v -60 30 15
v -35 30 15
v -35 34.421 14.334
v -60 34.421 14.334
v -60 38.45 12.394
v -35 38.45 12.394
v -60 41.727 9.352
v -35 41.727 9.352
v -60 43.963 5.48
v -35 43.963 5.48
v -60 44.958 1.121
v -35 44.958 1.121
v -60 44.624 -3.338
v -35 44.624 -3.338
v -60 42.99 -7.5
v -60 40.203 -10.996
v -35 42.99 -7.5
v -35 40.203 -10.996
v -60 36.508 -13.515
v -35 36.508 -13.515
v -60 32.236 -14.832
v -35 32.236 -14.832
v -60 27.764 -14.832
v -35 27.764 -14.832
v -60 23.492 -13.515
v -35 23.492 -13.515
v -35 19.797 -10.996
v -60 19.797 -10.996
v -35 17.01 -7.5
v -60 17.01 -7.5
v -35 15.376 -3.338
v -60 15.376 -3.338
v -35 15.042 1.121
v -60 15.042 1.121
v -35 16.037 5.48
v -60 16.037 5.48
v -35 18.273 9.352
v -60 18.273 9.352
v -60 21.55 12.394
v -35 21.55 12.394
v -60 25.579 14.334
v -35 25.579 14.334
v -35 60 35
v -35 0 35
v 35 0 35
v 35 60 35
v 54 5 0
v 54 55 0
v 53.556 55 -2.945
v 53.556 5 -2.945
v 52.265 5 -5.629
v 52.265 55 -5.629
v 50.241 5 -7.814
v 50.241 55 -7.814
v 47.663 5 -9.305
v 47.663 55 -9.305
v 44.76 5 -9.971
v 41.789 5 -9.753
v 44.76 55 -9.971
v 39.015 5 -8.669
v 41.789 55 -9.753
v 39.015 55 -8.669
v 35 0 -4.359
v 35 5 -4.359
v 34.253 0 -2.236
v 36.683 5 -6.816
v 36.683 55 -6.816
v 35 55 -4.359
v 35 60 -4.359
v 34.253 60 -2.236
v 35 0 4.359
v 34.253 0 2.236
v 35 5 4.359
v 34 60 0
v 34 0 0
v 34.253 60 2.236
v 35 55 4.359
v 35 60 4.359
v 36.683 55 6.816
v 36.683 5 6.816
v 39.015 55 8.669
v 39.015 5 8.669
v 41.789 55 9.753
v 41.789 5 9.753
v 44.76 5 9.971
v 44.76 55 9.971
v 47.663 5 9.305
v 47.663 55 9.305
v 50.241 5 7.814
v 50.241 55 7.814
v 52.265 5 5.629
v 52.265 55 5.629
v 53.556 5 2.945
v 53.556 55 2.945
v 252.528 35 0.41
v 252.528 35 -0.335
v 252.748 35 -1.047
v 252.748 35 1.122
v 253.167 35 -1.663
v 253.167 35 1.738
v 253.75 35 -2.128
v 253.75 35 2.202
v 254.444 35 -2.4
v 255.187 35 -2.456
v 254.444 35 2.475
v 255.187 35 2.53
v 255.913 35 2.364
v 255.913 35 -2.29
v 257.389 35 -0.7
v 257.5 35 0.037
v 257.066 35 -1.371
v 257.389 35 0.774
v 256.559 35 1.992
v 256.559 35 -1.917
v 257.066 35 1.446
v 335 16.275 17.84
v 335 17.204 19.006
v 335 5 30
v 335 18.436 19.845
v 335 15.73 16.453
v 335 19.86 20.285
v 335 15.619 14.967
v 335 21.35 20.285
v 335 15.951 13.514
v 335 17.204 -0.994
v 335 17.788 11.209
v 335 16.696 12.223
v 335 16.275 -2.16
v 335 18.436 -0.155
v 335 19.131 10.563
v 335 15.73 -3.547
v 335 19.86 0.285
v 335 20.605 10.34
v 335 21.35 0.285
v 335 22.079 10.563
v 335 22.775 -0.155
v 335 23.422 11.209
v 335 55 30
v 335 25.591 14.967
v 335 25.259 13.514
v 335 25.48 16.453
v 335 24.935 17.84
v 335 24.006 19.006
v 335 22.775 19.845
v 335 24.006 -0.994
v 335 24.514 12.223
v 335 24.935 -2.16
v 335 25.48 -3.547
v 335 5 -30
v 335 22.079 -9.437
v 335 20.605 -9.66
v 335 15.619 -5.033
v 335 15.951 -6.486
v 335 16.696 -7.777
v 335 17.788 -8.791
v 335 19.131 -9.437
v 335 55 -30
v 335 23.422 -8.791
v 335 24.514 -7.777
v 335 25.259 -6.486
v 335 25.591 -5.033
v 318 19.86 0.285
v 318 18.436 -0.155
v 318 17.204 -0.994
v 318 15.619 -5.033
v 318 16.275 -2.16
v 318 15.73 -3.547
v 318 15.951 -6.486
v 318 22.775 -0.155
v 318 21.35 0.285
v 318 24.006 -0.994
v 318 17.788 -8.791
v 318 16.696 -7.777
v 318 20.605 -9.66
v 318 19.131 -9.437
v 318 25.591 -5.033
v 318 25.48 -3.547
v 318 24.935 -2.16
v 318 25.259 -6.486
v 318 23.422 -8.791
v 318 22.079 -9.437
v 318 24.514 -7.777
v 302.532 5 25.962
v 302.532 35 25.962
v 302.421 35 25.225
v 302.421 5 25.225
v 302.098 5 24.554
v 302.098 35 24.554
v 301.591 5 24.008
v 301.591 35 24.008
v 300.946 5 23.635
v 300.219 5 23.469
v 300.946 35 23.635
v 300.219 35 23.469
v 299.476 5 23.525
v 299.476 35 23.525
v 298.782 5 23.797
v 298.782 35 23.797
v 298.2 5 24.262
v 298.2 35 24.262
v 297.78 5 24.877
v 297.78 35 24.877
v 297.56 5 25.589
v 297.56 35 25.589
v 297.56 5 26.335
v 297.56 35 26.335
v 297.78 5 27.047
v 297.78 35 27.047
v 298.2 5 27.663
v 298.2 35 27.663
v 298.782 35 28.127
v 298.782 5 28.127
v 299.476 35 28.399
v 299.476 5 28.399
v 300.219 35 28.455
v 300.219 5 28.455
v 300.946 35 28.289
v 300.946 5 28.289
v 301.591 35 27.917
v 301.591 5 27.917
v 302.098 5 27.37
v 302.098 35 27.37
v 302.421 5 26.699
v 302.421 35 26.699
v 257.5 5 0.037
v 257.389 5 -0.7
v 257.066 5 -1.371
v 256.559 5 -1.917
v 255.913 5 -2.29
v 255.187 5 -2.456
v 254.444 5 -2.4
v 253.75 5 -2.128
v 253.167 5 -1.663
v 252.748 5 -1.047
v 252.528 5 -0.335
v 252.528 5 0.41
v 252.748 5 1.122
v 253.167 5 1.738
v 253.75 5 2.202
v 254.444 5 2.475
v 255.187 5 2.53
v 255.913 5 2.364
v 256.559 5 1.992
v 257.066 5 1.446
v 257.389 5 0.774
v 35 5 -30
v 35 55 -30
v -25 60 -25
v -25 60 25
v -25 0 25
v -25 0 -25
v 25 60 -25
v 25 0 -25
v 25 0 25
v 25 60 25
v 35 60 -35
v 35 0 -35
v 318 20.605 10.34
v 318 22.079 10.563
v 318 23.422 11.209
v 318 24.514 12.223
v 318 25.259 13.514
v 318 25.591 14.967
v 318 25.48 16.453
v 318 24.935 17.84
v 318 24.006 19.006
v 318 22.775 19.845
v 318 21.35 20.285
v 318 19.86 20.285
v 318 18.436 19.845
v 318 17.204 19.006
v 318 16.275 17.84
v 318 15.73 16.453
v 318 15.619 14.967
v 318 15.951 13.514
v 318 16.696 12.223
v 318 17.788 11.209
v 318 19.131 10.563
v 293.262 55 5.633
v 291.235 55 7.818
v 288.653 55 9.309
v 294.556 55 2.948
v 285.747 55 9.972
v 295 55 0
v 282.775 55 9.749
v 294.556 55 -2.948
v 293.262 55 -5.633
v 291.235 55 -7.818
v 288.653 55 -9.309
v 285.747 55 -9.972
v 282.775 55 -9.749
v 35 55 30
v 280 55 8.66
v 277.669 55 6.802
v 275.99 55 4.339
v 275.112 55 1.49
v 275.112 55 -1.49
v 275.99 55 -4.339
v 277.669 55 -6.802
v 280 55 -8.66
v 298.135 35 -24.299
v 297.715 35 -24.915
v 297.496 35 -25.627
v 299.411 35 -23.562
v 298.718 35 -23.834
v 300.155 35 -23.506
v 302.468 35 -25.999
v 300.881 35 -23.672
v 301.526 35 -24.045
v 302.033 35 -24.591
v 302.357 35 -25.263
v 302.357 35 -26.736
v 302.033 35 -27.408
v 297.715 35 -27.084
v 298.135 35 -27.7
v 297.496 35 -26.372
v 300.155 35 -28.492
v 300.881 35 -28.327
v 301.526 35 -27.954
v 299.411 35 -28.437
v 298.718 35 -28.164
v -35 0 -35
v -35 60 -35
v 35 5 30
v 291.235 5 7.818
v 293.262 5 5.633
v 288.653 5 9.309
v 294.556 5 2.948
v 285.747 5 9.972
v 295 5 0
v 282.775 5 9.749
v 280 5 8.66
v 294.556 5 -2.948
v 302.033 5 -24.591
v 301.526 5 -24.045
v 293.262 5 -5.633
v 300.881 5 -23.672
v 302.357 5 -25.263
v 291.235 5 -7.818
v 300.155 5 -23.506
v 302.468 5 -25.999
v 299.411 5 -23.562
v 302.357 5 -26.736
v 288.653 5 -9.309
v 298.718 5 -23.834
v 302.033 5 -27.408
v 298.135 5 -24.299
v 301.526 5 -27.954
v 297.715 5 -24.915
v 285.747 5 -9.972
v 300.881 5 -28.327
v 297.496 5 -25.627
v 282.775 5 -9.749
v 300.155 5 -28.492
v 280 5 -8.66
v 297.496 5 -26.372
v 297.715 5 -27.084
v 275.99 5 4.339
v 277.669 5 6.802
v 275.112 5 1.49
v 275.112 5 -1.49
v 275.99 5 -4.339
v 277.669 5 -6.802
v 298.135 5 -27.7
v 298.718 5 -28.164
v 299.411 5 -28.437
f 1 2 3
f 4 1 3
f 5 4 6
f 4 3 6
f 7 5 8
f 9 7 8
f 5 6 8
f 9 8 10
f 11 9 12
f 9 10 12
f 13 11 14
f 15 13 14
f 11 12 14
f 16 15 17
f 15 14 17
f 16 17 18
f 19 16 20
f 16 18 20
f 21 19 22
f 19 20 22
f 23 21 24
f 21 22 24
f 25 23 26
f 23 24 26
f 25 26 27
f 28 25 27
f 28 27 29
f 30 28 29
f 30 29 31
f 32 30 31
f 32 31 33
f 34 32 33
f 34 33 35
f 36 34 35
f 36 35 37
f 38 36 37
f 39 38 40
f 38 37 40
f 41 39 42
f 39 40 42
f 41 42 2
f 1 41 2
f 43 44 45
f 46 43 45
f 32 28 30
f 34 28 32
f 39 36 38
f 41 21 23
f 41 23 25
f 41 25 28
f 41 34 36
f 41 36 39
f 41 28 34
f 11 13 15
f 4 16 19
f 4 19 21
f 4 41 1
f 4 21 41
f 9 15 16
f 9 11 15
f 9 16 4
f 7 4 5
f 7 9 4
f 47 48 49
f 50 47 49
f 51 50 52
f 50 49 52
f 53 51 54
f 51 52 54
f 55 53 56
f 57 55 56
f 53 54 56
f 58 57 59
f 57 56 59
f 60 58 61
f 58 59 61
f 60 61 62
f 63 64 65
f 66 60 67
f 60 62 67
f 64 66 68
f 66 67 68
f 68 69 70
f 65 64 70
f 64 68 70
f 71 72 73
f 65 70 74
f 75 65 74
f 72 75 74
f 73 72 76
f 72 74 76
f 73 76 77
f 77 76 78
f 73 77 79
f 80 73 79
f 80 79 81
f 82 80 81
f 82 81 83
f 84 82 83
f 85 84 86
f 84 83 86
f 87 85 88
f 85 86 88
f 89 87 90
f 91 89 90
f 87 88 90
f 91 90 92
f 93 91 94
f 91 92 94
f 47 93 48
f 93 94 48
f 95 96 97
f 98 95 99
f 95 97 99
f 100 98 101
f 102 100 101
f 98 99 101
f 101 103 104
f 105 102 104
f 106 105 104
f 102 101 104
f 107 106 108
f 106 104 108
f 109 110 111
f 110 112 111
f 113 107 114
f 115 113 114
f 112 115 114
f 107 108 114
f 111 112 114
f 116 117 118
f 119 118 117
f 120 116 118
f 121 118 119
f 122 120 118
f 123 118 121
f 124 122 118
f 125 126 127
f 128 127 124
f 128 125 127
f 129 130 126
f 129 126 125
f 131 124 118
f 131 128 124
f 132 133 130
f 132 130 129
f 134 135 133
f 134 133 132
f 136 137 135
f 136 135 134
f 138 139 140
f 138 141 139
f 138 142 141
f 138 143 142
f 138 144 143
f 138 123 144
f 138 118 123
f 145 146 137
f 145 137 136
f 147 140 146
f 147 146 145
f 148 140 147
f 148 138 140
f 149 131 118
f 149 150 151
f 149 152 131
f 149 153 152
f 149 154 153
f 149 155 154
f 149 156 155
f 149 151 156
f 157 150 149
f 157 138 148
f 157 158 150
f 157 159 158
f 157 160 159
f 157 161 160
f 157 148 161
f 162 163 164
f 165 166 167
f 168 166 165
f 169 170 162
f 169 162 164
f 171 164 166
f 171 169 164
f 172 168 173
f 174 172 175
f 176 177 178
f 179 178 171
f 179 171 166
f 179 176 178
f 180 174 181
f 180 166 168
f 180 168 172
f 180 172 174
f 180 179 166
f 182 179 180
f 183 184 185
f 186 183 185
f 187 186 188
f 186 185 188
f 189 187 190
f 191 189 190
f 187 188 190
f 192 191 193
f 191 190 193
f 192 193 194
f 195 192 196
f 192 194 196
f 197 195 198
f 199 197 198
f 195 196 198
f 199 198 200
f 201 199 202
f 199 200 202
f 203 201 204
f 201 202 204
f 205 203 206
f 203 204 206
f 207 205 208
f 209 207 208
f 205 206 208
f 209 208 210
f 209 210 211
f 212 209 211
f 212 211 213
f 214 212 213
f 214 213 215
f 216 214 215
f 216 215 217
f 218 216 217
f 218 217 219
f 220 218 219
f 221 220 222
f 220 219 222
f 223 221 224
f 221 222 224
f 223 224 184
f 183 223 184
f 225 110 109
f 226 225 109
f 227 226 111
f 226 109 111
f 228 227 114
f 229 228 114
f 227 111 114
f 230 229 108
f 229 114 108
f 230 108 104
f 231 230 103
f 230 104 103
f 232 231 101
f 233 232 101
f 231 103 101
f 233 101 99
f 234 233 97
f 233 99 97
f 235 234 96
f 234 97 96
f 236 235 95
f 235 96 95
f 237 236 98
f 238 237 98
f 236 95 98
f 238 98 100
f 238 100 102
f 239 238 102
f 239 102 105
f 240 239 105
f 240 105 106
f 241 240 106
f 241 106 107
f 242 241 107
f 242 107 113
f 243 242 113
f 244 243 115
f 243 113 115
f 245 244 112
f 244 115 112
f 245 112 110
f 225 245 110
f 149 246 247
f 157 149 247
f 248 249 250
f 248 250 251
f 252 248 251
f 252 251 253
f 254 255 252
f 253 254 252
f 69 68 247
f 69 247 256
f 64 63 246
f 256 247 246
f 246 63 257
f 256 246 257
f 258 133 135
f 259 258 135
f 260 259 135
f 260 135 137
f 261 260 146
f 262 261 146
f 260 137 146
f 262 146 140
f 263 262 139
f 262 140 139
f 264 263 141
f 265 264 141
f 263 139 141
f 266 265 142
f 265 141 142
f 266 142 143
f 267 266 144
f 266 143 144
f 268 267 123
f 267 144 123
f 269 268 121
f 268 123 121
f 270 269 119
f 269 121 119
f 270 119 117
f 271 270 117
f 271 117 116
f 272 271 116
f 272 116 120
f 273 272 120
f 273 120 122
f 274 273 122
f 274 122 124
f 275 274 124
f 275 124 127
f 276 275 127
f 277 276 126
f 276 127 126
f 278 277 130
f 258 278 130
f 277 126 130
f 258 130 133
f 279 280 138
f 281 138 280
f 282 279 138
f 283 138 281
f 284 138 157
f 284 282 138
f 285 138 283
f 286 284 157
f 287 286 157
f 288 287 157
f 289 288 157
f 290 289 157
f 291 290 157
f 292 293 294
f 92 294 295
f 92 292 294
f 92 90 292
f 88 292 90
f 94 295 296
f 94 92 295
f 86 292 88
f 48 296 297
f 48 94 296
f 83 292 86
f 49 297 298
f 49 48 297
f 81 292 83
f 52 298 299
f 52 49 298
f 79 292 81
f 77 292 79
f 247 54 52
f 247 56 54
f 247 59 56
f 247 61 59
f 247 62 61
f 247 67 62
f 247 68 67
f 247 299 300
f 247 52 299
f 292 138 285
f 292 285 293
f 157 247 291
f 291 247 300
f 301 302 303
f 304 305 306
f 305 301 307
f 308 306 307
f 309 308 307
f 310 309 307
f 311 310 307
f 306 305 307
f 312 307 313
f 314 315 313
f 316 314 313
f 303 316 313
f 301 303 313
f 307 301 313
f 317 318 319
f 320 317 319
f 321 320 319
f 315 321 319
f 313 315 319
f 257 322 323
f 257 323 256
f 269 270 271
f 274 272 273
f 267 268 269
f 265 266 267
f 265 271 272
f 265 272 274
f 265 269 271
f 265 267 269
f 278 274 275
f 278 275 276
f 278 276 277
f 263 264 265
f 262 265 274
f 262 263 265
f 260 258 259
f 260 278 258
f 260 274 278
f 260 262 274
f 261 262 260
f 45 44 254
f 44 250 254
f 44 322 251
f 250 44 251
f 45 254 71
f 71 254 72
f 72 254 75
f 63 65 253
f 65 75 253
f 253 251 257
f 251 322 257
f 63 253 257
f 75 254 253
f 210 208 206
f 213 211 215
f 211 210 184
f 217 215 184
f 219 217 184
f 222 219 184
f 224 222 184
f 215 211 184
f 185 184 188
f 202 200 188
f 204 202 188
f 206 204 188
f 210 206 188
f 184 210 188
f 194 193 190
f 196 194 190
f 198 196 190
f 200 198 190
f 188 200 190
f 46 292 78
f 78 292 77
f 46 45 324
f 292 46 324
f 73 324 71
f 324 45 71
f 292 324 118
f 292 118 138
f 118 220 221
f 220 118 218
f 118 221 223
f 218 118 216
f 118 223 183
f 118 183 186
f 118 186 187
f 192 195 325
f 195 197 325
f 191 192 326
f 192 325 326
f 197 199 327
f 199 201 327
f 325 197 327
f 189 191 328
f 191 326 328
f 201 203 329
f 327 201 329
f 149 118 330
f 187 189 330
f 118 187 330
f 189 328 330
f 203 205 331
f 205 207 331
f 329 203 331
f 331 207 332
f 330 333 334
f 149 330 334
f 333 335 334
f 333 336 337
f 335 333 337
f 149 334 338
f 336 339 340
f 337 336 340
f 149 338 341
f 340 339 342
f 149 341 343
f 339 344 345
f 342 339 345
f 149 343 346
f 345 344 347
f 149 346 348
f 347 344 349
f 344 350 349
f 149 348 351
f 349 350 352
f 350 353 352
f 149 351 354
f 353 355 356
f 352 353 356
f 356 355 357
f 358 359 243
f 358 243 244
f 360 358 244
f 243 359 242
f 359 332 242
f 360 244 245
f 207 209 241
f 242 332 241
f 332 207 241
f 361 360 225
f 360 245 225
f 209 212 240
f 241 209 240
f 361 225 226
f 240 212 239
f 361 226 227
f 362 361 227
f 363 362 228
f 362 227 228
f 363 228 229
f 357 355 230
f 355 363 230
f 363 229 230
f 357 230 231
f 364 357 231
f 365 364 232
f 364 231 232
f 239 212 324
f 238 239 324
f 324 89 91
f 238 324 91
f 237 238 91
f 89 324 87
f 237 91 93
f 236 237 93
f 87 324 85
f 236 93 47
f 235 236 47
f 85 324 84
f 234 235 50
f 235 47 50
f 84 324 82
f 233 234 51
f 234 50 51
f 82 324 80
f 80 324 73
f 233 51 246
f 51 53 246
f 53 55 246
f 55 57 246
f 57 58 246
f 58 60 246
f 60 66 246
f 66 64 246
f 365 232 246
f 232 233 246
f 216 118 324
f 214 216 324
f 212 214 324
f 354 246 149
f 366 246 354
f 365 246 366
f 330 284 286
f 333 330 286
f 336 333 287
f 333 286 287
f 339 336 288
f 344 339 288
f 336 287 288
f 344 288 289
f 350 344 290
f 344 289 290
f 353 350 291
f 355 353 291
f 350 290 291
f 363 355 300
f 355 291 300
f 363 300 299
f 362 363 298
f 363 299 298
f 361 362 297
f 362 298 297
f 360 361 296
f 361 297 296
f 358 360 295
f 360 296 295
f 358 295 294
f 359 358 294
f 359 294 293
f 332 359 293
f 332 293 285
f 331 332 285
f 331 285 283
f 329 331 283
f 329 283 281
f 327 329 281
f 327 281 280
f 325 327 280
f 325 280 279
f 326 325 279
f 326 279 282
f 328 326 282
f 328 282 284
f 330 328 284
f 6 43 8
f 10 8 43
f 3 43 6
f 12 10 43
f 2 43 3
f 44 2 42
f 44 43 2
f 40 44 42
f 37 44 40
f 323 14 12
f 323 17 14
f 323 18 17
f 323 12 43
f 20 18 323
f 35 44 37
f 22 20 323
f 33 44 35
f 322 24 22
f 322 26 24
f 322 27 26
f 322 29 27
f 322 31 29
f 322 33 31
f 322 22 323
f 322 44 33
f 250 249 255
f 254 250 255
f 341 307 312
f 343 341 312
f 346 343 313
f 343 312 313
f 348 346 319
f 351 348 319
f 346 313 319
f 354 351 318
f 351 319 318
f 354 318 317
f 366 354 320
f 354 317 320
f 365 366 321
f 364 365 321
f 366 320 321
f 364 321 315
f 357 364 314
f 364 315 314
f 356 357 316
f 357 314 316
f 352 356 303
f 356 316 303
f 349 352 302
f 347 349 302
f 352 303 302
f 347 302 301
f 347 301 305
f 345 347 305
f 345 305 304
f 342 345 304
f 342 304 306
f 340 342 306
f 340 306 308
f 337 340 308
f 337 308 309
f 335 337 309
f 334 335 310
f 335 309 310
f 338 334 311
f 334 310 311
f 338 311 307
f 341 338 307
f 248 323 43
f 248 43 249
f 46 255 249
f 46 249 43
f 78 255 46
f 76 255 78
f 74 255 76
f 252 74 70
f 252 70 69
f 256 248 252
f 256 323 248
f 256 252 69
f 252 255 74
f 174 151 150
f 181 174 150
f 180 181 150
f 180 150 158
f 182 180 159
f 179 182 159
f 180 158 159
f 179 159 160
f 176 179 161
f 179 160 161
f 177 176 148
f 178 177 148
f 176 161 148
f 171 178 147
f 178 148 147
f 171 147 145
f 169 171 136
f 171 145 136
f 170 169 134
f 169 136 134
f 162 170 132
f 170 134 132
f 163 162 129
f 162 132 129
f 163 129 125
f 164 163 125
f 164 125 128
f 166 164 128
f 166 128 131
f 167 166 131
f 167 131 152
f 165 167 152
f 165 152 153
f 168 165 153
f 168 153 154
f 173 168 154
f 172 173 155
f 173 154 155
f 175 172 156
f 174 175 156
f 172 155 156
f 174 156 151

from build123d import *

# Parameters (mm, degrees)
SKETCH1_W               = 70
SKETCH1_H               = 70
SKETCH1_W_2             = 50
SKETCH1_H_2             = 50
BOSS_EXTRUDE1_DEPTH     = 60
SKETCH2_W               = 60
SKETCH2_H               = 50
BOSS_EXTRUDE2_DEPTH     = 300
SKETCH3_R               = 15
BOSS_EXTRUDE3_DEPTH     = 25
SKETCH4_R               = 10
CUT_EXTRUDE1_DEPTH      = 56
SKETCH5_R               = 10
CUT_EXTRUDE2_DEPTH      = 6
CUT_EXTRUDE2_DEPTH_BACK = 56
CUT_EXTRUDE3_START      = -20
SKETCH8_R               = 2.5
CUT_EXTRUDE3_DEPTH      = 30
SKETCH9_R               = 5
CUT_EXTRUDE4_DEPTH      = 17


with BuildPart() as part:
    # Sketch1 → Boss-Extrude1 (new body)
    with BuildSketch(Plane(origin=(0, 0, 0), x_dir=(1, 0, 0), z_dir=(0, 1, 0))):
        Rectangle(SKETCH1_W, SKETCH1_H)
        Rectangle(SKETCH1_W_2, SKETCH1_H_2, mode=Mode.SUBTRACT)
    extrude(amount=BOSS_EXTRUDE1_DEPTH)

    # Sketch2 → Boss-Extrude2 (add)
    with BuildSketch(Plane(origin=(35, 0, 0), x_dir=(0, 0, -1), z_dir=(1, 0, 0))):
        with Locations((0, 30)):
            Rectangle(SKETCH2_W, SKETCH2_H)
    extrude(amount=BOSS_EXTRUDE2_DEPTH)

    # Sketch3 → Boss-Extrude3 (add)
    with BuildSketch(Plane.ZY.offset(35)):
        with Locations((0, 30)):
            Circle(SKETCH3_R)
    extrude(amount=BOSS_EXTRUDE3_DEPTH)

    # Sketch4 → Cut-Extrude1 (cut, through all)
    with BuildSketch(Plane(origin=(0, 55, 0), x_dir=(1, 0, 0), z_dir=(0, 1, 0))):
        with Locations((285, 0)):
            Circle(SKETCH4_R)
    extrude(amount=-CUT_EXTRUDE1_DEPTH, mode=Mode.SUBTRACT)

    # Sketch5 → Cut-Extrude2 (cut, two sides)
    with BuildSketch(Plane(origin=(0, 55, 0), x_dir=(1, 0, 0), z_dir=(0, 1, 0))) as cut_extrude2_sk:
        with Locations((44, 0)):
            Circle(SKETCH5_R)
    extrude(amount=CUT_EXTRUDE2_DEPTH, mode=Mode.SUBTRACT)
    extrude(cut_extrude2_sk.sketch, amount=-CUT_EXTRUDE2_DEPTH_BACK, mode=Mode.SUBTRACT)

    # Sketch8 → Cut-Extrude3 (cut)
    with BuildSketch(Plane(origin=(0, 55, 0), x_dir=(1, 0, 0), z_dir=(0, 1, 0)).offset(CUT_EXTRUDE3_START)):
        with Locations((255.00002319, -0.037301815)):
            Circle(SKETCH8_R)
        with Locations((299.967684086, 25.999392937)):
            Circle(SKETCH8_R)
        with Locations((300.032292724, -25.962091123)):
            Circle(SKETCH8_R)
    extrude(amount=-CUT_EXTRUDE3_DEPTH, mode=Mode.SUBTRACT)

    # Sketch9 → Cut-Extrude4 (cut)
    with BuildSketch(Plane(origin=(335, 0, 0), x_dir=(0, 0, -1), z_dir=(1, 0, 0))):
        with Locations((-15.340483078, 20.605088766)):
            Circle(SKETCH9_R)
        with Locations((4.659516922, 20.605088766)):
            Circle(SKETCH9_R)
    extrude(amount=-CUT_EXTRUDE4_DEPTH, mode=Mode.SUBTRACT)


solid = part.part
